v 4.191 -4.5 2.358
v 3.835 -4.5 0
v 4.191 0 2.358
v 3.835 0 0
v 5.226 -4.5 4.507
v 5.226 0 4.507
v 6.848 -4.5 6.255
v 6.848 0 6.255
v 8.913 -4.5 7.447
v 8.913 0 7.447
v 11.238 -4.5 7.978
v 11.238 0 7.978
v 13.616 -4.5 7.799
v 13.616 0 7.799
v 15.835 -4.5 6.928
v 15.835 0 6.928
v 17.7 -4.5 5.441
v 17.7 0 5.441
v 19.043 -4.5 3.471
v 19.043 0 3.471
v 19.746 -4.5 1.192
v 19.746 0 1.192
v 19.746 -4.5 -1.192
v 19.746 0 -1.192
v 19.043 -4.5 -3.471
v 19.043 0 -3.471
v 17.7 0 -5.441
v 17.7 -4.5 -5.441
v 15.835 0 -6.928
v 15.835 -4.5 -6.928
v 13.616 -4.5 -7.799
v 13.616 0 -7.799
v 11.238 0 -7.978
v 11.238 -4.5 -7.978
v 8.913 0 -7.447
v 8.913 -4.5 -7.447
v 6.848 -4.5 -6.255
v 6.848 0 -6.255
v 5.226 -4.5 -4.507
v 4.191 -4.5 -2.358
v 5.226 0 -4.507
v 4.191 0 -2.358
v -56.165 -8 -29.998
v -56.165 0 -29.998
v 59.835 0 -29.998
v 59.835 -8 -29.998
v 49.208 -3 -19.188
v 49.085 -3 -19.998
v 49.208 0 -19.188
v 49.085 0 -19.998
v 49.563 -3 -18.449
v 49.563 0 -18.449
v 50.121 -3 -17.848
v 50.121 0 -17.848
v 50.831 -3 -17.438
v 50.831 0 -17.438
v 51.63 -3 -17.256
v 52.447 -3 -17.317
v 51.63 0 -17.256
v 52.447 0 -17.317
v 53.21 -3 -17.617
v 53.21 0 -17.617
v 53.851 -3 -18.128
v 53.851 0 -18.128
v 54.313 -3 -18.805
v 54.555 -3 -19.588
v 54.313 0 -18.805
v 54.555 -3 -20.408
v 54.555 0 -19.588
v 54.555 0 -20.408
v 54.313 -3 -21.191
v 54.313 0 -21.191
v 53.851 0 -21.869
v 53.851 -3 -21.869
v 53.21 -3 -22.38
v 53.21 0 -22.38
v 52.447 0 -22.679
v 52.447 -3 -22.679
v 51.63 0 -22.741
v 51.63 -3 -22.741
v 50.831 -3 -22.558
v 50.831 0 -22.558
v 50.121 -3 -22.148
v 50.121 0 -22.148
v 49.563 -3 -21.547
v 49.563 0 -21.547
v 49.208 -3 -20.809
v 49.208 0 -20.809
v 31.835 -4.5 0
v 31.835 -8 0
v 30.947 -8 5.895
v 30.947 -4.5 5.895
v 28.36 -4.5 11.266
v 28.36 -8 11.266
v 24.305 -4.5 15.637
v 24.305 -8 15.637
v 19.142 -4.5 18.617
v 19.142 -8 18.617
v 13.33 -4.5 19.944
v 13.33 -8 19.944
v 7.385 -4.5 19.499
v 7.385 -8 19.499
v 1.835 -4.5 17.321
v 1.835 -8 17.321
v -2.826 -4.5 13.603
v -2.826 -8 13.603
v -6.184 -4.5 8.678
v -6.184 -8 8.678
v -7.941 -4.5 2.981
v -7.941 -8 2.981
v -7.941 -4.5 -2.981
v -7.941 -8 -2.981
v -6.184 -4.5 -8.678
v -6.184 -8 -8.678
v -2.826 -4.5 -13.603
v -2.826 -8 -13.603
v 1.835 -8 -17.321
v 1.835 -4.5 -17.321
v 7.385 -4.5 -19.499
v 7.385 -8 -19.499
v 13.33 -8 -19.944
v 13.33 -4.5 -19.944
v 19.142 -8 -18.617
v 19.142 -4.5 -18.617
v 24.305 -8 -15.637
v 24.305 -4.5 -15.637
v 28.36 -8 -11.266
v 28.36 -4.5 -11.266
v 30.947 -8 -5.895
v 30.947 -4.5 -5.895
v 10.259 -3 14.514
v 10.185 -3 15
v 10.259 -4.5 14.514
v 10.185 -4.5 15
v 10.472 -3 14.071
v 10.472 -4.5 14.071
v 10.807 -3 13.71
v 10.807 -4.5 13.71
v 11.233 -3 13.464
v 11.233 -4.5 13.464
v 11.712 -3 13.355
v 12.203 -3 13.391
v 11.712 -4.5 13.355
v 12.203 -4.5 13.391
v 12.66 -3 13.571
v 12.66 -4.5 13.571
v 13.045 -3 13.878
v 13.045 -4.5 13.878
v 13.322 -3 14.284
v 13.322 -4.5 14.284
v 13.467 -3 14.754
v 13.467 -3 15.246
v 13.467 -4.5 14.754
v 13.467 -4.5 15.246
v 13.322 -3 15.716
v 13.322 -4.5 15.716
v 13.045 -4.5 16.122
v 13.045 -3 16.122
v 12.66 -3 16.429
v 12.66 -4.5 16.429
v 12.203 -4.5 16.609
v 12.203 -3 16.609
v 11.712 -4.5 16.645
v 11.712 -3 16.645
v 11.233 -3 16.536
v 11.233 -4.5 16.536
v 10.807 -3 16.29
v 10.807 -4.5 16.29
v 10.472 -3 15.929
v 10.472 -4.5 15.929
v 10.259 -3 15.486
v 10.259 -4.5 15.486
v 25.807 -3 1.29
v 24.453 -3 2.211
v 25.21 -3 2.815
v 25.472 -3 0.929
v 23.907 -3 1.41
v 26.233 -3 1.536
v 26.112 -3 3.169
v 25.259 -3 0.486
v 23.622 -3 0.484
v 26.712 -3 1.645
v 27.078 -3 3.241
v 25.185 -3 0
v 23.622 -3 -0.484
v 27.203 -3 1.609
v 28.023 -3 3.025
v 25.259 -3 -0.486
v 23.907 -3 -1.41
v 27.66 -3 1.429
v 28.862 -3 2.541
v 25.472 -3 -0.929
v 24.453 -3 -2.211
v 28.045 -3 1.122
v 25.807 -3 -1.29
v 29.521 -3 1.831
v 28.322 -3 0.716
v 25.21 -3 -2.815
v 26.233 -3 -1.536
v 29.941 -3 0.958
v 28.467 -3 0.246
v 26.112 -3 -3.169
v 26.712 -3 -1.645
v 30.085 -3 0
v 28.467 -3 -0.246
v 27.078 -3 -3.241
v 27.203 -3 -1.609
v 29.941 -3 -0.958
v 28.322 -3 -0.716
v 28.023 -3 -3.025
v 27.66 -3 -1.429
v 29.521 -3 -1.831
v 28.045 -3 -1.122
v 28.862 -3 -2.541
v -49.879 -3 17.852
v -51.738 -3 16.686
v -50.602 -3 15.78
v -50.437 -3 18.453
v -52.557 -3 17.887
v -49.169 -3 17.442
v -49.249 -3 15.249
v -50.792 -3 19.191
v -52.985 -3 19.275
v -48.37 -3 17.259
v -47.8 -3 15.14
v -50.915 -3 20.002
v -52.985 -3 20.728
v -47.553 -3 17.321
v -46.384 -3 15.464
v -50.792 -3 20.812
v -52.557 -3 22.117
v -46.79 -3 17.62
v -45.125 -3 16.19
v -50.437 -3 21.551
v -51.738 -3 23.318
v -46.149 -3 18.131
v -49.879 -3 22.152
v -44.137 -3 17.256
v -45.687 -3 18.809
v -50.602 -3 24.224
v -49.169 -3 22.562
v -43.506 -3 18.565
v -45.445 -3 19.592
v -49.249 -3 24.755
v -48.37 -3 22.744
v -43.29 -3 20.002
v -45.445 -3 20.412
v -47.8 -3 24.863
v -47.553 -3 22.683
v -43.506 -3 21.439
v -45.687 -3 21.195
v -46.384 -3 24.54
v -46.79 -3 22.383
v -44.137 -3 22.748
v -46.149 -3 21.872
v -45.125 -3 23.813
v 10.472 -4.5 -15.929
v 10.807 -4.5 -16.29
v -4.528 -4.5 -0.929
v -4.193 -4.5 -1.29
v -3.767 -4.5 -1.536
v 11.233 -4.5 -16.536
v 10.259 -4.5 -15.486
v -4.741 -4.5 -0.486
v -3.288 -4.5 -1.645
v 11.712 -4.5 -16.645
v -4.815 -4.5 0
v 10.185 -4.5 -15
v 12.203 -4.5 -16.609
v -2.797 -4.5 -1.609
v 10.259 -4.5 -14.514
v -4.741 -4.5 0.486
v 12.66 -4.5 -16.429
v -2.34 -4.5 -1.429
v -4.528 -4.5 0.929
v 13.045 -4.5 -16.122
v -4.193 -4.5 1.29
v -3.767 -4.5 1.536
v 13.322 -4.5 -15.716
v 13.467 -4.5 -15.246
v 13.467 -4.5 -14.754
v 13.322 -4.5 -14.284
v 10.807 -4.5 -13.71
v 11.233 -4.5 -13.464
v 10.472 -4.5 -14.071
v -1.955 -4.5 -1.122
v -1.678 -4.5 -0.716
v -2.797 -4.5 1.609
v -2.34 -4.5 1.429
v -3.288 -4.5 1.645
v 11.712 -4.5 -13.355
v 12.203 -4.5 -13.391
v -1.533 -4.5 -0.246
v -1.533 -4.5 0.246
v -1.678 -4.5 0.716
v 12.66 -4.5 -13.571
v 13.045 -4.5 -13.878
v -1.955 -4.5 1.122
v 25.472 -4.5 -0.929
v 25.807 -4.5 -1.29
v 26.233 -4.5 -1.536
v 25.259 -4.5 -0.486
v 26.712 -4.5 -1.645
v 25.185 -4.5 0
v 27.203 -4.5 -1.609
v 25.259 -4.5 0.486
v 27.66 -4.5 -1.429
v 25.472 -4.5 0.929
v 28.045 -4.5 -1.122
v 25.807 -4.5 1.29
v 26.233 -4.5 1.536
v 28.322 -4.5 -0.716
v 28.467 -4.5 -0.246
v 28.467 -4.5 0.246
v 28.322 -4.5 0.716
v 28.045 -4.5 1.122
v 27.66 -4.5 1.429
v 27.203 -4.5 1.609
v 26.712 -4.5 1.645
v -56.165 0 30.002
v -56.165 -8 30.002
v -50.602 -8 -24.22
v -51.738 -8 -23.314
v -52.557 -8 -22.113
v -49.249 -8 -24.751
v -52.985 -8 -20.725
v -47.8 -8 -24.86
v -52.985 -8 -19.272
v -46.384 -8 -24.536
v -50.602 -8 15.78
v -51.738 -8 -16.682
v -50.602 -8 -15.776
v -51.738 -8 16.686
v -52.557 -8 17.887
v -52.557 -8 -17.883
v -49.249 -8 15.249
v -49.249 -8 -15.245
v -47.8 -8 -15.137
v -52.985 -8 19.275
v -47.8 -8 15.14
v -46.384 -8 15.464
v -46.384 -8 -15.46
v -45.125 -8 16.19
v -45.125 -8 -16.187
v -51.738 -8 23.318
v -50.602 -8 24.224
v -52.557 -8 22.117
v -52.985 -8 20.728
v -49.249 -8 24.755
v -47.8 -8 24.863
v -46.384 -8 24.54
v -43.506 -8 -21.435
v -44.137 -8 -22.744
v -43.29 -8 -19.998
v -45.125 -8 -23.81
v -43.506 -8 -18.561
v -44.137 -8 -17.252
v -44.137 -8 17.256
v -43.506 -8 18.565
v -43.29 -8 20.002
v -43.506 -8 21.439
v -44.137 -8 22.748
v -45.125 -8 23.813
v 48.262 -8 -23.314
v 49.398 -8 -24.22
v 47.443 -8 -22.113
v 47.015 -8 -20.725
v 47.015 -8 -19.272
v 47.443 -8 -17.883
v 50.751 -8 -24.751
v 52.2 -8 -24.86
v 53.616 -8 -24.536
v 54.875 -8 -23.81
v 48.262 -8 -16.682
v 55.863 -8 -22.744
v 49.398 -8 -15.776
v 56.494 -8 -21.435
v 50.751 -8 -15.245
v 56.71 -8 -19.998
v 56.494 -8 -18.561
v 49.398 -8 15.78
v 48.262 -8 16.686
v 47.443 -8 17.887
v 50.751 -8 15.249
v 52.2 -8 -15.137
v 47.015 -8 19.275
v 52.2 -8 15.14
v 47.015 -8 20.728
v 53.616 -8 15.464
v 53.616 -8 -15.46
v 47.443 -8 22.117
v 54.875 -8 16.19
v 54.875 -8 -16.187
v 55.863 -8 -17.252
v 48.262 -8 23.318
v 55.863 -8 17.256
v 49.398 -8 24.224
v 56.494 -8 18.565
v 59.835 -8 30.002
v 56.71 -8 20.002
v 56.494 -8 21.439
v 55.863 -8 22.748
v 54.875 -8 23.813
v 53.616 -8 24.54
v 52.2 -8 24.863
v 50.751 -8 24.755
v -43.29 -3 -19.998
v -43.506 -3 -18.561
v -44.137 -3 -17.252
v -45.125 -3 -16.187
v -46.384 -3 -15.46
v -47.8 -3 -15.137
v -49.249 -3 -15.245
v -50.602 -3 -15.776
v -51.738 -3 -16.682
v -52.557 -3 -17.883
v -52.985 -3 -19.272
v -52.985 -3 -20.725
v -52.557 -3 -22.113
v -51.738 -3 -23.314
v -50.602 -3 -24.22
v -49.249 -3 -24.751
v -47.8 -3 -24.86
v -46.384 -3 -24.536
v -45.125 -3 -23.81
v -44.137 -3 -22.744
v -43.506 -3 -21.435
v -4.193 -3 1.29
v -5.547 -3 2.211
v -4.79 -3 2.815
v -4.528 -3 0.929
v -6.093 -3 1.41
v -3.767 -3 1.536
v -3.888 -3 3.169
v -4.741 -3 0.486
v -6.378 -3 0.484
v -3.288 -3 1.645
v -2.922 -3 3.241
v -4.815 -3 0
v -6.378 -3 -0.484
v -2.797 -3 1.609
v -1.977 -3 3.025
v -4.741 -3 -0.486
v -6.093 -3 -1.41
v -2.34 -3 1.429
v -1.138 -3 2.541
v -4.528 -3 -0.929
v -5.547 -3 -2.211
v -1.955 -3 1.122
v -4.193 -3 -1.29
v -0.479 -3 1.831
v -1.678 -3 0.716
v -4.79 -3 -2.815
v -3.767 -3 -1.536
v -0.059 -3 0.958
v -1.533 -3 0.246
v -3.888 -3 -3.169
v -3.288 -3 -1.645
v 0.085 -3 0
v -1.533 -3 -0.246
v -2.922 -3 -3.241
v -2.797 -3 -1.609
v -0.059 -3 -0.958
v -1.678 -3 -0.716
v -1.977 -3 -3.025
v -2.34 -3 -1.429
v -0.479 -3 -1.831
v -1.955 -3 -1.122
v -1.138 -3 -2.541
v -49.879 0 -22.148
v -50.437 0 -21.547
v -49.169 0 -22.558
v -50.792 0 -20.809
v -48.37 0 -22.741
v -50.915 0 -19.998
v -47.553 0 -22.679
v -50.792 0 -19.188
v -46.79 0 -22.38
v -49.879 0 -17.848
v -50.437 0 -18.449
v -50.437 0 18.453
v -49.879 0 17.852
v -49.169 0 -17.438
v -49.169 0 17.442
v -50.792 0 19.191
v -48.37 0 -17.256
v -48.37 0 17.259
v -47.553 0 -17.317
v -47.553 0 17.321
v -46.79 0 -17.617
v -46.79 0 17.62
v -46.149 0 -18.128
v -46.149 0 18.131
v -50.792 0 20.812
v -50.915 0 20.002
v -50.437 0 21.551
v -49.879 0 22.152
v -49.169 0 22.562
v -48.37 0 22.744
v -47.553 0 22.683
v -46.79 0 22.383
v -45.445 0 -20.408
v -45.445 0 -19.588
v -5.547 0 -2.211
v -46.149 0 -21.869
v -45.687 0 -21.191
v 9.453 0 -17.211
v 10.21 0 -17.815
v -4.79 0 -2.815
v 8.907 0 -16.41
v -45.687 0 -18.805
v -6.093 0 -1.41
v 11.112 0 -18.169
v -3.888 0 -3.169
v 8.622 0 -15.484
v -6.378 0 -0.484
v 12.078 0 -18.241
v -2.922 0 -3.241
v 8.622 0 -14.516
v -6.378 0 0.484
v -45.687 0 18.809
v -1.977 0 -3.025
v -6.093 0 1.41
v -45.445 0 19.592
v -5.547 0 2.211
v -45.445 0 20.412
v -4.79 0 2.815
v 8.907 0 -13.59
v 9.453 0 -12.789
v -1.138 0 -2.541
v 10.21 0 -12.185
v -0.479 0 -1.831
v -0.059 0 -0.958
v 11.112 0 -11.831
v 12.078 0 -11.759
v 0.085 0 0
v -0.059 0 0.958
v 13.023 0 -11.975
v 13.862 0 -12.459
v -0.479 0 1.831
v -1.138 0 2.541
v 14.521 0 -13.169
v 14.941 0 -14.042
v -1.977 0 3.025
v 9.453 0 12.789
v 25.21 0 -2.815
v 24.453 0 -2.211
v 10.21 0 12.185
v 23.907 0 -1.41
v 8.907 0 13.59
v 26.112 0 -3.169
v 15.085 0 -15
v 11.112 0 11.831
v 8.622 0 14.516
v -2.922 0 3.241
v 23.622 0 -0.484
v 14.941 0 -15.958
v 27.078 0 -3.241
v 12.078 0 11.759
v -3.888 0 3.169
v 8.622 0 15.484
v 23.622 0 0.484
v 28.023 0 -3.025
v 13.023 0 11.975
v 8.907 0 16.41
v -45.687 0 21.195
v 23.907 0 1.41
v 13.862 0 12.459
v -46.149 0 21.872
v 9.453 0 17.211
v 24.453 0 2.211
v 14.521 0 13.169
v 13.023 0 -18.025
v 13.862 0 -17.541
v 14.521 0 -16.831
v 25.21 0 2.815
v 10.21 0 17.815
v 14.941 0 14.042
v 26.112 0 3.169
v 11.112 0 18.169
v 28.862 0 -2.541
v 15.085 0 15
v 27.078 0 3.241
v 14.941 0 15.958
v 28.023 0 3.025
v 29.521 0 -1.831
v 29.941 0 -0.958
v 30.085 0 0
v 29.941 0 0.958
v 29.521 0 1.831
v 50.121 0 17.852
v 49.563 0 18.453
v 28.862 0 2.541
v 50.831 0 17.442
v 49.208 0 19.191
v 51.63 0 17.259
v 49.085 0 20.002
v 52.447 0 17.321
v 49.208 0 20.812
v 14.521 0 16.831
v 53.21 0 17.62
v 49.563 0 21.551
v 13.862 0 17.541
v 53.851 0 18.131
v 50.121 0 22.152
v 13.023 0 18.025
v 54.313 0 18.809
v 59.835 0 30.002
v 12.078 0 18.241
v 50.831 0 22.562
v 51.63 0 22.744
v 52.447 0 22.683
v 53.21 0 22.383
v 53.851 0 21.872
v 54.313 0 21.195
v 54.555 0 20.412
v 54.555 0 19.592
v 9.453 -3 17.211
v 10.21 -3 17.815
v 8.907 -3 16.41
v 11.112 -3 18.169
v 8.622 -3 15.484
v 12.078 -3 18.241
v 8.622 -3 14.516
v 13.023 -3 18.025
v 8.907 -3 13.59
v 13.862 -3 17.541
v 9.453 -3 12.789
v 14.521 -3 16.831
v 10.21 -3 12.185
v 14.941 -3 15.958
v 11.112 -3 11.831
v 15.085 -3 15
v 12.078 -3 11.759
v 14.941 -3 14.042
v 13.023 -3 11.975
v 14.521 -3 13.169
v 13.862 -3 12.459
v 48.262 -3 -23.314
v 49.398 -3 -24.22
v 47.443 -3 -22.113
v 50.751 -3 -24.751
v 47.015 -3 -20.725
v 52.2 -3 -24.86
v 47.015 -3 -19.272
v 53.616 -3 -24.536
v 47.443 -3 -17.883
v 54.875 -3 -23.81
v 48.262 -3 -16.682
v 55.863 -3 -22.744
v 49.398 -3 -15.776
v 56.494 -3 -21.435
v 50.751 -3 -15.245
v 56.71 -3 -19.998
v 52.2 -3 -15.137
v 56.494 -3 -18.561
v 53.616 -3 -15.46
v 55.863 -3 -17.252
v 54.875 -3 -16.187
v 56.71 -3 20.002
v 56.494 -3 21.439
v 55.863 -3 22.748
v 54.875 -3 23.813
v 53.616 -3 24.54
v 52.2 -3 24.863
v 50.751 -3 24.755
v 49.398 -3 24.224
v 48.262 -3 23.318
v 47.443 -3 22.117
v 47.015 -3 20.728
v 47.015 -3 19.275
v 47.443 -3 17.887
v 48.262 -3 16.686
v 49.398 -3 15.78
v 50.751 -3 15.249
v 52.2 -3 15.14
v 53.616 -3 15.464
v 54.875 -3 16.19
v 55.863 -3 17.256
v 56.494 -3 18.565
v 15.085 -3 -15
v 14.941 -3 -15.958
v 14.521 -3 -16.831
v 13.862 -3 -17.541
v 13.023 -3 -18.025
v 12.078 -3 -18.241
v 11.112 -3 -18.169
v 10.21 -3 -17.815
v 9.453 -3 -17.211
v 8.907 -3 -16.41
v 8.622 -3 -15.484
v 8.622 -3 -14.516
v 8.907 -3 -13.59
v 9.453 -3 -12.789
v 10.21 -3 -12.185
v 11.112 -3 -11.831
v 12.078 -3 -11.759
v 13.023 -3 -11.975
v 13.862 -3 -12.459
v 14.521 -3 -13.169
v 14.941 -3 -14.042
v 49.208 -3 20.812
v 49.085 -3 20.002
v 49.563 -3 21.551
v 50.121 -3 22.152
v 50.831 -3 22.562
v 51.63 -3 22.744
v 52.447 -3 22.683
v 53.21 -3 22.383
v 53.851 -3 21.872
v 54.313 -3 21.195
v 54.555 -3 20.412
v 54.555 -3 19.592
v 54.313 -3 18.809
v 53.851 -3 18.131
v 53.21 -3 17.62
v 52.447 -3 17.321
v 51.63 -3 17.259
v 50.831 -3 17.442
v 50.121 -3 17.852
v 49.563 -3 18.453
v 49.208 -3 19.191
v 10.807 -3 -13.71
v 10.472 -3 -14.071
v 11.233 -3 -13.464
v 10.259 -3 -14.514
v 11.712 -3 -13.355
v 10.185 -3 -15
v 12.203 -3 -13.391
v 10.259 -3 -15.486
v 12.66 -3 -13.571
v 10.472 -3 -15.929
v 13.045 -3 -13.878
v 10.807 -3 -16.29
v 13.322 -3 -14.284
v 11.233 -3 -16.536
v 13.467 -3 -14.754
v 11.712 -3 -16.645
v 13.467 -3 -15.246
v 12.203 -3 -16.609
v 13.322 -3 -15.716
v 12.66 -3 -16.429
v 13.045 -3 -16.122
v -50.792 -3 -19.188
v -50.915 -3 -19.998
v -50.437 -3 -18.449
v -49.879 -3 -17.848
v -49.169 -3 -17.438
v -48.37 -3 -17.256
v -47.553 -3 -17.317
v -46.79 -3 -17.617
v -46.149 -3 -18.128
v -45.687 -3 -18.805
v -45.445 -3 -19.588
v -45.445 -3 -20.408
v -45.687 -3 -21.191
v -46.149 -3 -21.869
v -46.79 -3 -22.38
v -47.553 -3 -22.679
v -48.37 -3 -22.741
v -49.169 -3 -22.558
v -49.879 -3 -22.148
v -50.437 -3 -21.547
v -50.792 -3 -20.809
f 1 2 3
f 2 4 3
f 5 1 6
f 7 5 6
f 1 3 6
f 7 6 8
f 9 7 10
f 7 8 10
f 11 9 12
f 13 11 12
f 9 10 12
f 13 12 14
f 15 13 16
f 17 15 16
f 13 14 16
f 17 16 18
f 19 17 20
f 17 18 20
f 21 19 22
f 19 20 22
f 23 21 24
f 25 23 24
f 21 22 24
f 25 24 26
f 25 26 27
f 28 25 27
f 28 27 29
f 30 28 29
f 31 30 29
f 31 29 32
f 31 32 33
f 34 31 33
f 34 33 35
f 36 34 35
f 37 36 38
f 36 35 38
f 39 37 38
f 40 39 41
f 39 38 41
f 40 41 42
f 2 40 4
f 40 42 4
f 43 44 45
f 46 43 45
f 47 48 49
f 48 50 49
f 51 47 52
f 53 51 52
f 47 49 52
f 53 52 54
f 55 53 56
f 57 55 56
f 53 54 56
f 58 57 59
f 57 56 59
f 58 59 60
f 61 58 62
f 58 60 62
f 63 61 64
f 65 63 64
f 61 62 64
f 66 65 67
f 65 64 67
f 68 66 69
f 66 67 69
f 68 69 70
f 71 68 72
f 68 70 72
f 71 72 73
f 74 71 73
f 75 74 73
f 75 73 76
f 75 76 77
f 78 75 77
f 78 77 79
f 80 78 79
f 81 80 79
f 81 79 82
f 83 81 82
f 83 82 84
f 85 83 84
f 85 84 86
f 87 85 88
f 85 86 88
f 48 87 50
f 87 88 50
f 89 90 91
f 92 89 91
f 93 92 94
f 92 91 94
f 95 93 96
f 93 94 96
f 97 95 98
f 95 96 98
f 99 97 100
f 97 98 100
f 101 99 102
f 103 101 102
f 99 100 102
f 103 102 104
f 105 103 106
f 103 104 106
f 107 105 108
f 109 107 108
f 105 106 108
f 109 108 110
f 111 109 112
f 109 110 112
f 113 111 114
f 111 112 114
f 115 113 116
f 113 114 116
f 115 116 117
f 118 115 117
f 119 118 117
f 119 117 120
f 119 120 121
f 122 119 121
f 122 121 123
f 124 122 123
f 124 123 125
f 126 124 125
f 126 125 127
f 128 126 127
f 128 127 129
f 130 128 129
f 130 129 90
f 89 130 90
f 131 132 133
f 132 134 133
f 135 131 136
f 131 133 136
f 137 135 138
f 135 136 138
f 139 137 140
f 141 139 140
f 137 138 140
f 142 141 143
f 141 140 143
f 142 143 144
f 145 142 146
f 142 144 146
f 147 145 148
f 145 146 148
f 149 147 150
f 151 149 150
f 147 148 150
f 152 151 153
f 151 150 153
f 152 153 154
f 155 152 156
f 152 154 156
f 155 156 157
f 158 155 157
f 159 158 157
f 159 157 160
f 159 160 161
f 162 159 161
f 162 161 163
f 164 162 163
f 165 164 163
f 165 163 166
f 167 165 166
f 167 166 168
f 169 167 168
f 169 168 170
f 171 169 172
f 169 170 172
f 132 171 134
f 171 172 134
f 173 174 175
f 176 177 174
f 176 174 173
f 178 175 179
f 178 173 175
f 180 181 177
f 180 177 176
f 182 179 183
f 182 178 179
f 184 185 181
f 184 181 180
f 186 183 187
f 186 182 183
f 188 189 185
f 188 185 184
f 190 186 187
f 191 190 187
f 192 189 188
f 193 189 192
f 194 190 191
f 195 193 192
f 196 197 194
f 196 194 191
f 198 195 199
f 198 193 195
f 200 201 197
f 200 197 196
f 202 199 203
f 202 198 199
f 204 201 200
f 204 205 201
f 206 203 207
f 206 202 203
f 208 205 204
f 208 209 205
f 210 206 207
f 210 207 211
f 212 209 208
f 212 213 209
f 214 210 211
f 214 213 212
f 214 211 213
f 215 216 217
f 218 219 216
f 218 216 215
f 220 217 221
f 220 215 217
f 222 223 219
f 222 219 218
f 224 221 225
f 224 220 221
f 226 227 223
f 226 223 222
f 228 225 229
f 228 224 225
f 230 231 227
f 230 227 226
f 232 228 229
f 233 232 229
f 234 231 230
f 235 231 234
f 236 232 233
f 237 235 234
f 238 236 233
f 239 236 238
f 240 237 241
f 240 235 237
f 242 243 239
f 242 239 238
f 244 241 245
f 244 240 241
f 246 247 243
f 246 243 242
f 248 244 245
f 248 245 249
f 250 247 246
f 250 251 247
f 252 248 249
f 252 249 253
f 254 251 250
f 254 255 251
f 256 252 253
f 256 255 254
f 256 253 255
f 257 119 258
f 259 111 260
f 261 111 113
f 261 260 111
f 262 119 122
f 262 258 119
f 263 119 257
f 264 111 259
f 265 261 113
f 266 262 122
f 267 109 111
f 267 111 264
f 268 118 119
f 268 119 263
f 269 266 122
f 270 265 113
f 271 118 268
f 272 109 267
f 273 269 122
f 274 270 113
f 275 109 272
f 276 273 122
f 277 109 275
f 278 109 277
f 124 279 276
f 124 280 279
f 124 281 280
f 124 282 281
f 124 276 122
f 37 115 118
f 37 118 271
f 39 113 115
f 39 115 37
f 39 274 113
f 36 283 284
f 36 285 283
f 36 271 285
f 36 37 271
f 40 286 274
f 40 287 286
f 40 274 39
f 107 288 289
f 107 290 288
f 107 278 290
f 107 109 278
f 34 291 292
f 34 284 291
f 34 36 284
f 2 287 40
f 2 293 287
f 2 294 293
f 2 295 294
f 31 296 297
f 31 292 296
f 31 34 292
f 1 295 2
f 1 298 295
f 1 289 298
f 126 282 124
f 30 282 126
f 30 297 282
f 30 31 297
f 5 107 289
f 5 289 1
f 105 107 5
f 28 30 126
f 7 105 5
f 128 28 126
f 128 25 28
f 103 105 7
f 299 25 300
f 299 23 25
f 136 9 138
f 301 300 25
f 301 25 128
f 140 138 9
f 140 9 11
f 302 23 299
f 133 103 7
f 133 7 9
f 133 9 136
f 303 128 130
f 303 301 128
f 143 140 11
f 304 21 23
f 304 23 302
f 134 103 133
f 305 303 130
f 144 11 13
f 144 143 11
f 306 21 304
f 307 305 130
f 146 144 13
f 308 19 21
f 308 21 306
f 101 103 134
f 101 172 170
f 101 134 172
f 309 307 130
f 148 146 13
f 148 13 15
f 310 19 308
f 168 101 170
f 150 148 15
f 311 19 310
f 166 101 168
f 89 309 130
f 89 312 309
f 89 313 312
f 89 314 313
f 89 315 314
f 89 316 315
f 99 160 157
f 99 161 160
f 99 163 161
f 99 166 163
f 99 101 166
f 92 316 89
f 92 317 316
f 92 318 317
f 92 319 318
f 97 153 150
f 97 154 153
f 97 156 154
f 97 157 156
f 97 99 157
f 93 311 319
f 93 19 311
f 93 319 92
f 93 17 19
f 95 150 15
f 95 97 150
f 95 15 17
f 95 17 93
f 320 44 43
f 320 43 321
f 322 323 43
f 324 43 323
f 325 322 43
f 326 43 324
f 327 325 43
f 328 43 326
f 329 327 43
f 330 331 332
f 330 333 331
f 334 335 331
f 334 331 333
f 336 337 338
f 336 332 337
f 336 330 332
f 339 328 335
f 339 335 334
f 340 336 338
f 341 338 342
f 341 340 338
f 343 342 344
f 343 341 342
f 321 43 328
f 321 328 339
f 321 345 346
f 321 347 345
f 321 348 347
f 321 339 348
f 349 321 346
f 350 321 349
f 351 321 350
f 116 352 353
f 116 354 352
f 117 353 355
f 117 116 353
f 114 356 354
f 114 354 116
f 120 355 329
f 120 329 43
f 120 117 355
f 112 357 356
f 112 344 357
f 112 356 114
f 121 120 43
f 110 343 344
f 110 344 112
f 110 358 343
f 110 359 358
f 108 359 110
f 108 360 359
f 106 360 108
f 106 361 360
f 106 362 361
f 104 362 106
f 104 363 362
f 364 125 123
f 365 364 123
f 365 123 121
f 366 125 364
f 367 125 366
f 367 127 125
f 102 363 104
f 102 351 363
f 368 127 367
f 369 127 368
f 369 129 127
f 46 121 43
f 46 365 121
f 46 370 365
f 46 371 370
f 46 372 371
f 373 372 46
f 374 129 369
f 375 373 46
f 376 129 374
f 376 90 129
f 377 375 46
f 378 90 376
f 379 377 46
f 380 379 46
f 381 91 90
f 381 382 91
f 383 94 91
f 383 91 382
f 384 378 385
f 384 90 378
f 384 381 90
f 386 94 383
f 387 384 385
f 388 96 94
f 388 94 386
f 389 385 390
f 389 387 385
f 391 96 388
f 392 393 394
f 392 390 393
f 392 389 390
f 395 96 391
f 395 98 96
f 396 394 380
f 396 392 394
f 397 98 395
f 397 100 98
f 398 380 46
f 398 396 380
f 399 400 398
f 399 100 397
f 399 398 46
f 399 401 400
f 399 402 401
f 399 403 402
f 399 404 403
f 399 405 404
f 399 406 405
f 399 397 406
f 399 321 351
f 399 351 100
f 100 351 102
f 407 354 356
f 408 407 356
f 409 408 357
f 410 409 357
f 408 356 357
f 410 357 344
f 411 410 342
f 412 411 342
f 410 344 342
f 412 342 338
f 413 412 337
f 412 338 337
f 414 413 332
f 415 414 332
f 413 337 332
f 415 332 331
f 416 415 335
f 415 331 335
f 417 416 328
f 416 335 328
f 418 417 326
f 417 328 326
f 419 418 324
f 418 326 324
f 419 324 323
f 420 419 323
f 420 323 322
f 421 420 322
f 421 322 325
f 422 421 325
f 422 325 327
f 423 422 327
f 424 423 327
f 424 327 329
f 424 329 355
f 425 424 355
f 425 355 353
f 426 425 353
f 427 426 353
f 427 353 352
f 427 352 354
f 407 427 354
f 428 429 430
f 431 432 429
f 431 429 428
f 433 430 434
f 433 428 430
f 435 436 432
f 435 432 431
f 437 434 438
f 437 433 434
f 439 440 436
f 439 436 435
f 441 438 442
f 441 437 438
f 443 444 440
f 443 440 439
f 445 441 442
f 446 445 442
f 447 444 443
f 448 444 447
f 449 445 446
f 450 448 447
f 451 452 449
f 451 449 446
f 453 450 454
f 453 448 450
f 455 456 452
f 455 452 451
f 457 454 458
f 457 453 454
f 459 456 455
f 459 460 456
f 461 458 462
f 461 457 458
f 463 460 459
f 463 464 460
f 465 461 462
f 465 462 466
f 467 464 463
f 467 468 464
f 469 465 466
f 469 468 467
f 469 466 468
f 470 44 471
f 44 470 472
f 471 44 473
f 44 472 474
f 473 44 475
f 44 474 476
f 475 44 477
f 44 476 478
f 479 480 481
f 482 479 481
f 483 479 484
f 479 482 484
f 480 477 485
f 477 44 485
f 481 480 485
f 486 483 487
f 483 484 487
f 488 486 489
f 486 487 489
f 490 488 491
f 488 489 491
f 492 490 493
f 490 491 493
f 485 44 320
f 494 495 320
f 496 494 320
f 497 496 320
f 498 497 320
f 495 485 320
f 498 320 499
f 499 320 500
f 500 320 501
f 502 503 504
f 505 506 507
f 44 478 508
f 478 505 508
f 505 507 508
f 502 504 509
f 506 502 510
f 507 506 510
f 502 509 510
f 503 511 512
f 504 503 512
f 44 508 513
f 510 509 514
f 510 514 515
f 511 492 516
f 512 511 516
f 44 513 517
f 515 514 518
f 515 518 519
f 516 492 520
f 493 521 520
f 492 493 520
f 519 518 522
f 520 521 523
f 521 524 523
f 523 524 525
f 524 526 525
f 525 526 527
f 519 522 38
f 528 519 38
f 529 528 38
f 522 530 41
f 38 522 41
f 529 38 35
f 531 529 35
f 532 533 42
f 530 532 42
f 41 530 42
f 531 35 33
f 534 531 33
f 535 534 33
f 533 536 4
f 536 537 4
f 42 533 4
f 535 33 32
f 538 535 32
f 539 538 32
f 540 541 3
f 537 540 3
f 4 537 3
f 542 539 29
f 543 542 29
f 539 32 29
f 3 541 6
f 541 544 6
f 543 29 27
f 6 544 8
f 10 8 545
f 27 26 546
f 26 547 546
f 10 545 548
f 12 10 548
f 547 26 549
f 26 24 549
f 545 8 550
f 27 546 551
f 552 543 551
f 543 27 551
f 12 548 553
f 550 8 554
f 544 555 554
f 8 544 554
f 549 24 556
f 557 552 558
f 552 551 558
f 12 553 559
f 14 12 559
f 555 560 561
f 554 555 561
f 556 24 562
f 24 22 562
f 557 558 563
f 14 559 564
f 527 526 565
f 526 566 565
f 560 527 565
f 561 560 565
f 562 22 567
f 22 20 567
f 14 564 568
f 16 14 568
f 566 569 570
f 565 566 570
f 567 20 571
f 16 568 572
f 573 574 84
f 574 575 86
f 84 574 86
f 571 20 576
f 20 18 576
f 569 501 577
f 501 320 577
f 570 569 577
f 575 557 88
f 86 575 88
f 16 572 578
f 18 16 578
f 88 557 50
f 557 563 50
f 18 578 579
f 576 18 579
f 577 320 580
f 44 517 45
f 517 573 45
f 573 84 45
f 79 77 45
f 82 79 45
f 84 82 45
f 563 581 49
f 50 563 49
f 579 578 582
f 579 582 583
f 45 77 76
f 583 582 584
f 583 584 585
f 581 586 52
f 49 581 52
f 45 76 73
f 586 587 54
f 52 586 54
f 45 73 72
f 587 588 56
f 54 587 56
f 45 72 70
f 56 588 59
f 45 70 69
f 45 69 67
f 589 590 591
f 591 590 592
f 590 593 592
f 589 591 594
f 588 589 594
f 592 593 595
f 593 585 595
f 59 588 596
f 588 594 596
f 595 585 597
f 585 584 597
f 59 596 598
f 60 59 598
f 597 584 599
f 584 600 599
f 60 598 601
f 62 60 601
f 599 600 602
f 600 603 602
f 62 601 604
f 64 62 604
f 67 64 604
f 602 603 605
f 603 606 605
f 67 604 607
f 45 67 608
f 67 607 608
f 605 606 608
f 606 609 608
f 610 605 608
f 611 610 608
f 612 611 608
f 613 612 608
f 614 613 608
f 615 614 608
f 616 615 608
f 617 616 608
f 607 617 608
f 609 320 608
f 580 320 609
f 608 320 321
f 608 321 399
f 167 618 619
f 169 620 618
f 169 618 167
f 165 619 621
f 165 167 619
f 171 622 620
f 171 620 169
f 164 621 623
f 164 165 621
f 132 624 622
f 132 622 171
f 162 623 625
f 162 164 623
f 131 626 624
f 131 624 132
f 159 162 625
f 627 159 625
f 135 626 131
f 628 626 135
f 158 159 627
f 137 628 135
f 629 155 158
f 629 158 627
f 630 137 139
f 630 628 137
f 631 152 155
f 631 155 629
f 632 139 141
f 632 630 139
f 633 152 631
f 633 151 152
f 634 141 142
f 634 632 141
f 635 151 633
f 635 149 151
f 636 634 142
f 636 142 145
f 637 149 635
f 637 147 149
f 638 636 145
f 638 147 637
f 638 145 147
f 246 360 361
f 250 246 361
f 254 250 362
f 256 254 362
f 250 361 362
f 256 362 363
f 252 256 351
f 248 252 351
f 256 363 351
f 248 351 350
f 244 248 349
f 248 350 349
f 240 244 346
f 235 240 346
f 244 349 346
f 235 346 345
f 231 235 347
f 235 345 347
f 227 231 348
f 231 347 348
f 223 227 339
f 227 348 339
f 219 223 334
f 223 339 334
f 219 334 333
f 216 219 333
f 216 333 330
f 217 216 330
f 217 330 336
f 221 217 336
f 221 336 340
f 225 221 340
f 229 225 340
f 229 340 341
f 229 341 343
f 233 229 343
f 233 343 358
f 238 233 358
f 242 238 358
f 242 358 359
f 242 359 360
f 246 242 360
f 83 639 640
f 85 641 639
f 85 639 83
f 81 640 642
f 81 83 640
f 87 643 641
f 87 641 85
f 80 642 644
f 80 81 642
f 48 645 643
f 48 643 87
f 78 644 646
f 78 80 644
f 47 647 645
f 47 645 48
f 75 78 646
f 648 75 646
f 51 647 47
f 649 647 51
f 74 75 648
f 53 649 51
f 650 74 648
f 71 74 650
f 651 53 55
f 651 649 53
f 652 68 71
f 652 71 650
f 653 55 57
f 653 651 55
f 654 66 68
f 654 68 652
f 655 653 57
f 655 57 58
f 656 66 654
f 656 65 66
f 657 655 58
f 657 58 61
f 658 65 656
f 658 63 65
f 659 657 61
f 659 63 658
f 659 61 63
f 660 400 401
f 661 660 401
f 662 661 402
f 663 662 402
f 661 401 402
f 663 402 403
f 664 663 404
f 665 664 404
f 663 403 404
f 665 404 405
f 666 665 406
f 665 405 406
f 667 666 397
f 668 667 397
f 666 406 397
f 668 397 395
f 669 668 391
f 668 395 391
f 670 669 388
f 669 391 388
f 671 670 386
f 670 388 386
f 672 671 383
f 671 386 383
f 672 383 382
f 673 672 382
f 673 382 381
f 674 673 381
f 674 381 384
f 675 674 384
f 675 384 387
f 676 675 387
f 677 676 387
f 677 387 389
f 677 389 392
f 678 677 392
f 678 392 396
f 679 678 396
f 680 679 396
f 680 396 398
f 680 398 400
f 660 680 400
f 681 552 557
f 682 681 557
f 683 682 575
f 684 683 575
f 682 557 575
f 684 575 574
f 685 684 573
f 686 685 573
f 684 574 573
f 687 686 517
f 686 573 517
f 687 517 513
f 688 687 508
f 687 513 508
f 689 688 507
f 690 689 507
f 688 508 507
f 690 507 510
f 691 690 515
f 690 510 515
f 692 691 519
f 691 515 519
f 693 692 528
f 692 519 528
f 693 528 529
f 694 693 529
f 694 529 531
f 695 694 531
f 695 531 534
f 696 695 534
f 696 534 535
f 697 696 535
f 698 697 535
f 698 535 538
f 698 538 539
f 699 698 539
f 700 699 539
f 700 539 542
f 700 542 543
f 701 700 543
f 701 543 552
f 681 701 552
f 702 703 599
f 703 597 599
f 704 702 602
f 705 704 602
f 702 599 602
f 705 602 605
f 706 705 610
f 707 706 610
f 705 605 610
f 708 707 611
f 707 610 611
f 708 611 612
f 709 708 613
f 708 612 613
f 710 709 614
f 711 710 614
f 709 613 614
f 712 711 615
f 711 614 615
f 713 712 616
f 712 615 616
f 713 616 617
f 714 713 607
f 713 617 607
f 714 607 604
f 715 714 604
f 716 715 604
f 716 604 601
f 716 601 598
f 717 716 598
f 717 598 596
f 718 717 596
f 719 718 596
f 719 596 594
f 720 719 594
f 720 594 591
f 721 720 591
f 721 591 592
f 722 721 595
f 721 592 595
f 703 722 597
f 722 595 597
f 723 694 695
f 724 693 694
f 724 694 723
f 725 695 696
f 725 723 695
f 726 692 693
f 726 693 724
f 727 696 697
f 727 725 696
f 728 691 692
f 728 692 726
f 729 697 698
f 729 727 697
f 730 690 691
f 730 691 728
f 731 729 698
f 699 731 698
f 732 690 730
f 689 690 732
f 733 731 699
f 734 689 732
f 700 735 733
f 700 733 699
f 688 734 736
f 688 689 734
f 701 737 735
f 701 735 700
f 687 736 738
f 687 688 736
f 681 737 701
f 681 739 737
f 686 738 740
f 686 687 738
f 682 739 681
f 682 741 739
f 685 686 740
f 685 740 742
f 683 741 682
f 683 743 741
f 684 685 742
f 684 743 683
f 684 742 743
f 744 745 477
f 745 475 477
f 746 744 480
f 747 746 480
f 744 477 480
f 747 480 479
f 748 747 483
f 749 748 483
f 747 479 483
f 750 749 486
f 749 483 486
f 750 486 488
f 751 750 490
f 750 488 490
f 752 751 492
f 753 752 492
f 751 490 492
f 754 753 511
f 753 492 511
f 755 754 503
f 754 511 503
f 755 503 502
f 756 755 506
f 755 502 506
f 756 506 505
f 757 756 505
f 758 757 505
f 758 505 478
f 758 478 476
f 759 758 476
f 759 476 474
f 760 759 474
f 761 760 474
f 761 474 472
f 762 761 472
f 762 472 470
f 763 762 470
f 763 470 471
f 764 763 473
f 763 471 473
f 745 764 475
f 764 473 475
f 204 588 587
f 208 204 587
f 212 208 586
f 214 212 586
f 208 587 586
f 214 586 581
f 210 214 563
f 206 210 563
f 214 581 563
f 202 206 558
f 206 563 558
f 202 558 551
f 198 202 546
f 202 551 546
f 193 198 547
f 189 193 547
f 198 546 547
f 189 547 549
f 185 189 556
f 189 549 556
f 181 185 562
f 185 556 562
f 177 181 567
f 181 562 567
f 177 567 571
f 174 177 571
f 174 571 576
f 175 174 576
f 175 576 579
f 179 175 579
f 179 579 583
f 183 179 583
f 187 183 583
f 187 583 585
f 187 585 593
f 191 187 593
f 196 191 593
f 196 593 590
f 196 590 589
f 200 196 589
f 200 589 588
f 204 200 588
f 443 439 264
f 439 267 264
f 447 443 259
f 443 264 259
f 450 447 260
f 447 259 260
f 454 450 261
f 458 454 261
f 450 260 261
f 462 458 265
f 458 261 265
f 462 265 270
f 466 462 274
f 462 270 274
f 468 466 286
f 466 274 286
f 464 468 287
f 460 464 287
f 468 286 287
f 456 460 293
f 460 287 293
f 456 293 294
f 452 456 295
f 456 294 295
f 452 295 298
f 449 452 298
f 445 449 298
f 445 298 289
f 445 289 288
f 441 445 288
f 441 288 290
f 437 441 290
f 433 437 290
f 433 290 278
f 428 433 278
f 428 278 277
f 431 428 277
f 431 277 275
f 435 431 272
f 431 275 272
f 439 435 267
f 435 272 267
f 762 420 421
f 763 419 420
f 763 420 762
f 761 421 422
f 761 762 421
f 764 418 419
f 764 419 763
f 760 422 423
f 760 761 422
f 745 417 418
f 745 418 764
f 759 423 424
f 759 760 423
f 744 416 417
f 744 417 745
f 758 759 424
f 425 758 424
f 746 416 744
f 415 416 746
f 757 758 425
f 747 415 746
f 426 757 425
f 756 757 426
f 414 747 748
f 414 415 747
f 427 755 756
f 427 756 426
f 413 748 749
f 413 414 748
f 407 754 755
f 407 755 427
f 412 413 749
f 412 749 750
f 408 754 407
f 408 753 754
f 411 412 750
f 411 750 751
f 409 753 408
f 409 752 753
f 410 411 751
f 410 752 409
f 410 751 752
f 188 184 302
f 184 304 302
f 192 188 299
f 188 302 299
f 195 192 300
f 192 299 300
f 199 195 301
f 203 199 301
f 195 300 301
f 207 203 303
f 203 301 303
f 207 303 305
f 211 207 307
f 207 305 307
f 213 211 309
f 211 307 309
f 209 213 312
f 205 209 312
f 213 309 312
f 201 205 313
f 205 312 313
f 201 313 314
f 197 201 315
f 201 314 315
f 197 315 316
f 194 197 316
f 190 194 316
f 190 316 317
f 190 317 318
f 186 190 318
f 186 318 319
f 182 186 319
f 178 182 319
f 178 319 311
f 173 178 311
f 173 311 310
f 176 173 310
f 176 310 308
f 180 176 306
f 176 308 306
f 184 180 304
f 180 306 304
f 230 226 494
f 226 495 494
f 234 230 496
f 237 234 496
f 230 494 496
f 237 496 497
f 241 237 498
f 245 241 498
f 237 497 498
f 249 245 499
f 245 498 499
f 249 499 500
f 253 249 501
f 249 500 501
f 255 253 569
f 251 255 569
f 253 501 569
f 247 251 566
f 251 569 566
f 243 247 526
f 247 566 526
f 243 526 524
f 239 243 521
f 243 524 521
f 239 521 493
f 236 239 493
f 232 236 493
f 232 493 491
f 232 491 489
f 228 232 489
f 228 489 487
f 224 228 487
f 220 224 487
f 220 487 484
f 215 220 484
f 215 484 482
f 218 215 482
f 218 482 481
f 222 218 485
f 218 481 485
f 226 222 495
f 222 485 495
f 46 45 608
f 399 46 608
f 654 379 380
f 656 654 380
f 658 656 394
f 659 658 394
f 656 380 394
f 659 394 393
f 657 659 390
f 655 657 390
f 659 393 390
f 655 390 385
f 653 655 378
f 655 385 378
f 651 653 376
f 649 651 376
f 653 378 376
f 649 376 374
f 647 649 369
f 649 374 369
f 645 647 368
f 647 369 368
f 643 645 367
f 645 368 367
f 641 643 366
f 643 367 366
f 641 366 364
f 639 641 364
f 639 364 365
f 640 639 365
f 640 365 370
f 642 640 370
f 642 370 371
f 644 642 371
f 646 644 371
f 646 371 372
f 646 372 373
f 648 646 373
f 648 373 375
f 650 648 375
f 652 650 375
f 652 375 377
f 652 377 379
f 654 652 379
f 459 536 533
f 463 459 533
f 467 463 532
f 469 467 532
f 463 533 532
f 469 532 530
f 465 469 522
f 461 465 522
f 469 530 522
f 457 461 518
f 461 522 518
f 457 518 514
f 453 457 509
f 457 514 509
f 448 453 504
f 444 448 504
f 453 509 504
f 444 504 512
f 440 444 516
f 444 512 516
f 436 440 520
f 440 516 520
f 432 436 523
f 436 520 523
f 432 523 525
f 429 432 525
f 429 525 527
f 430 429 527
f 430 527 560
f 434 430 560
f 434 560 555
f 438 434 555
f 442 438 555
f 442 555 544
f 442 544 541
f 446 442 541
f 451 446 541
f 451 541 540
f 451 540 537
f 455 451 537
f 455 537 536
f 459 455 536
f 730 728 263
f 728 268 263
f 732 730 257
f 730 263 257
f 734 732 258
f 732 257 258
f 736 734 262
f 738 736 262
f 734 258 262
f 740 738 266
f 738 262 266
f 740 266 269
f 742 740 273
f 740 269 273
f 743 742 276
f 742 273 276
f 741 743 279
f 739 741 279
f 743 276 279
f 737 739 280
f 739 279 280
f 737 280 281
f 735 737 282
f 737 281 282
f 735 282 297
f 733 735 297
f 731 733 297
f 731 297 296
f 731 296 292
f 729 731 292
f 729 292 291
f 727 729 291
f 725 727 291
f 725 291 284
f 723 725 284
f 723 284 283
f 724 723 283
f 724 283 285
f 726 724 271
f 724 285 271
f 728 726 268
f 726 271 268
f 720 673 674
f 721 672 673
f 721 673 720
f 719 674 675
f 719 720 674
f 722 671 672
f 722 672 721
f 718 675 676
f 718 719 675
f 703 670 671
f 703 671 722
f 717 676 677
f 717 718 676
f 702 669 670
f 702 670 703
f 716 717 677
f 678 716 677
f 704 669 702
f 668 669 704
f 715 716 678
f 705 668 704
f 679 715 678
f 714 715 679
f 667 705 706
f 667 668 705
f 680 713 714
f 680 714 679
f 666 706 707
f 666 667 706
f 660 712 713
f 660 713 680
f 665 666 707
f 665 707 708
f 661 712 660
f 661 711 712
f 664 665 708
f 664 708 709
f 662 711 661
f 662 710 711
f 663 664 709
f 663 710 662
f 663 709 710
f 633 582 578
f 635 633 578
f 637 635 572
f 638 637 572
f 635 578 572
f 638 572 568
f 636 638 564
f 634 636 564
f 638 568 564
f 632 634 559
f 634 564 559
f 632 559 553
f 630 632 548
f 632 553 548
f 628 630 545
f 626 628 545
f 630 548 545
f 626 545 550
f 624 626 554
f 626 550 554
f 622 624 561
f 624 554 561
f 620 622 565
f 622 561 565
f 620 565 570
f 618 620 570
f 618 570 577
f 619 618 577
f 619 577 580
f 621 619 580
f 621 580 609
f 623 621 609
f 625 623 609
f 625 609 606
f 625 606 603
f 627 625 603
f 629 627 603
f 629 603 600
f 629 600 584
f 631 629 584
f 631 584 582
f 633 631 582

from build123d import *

# Parameters (mm, degrees)
F0_W           = 116
F0_H           = 60
F1_DEPTH       = 8
F3_D           = 5.5
F3_DEPTH       = 13.8
F3_CBORE_D     = 9.75
F3_CBORE_DEPTH = 5
F3_TIP         = 1.6523667023
F4_D           = 16
F4_DEPTH       = 13.8
F4_CBORE_D     = 40
F4_CBORE_DEPTH = 3.5
F4_TIP         = 4.8068849522
F5_D           = 3.3
F5_DEPTH       = 13.8
F5_CBORE_D     = 6.5
F5_CBORE_DEPTH = 3
F5_TIP         = 0.9914200214


with BuildPart() as f1:
    # F0 (on Front) → F1 (new body)
    with BuildSketch(Plane.XZ):
        with Locations((1.8354473706, 0.0017675648)):
            Rectangle(F0_W, F0_H)
    extrude(amount=F1_DEPTH)

    # F3
    with Locations(Plane.XZ.offset(8)):
        with Locations((-48.1645526294, 20.0017675648), (-48.1645526294, -19.9982324352), (51.8354473706, 20.0017675648), (51.8354473706, -19.9982324352)):
            CounterBoreHole(F3_D / 2, F3_CBORE_D / 2, F3_CBORE_DEPTH, depth=F3_DEPTH)
            with Locations((0, 0, -(F3_DEPTH + F3_TIP / 2))):  # 118° drill point
                Cone(0, F3_D / 2, F3_TIP, mode=Mode.SUBTRACT)

    # F4
    with Locations(Plane.XZ.offset(8)):
        with Locations((11.8354473706, 0)):
            CounterBoreHole(F4_D / 2, F4_CBORE_D / 2, F4_CBORE_DEPTH, depth=F4_DEPTH)
            with Locations((0, 0, -(F4_DEPTH + F4_TIP / 2))):  # 118° drill point
                Cone(0, F4_D / 2, F4_TIP, mode=Mode.SUBTRACT)

    # F5
    with Locations(Plane(origin=(0, 0, 0), x_dir=(1, 0, 0), z_dir=(0, 1, 0))):
        with Locations((11.8354473706, -15), (26.8354473706, 0), (11.8354473706, 15), (-3.1645526294, 0)):
            CounterBoreHole(F5_D / 2, F5_CBORE_D / 2, F5_CBORE_DEPTH, depth=F5_DEPTH)
            with Locations((0, 0, -(F5_DEPTH + F5_TIP / 2))):  # 118° drill point
                Cone(0, F5_D / 2, F5_TIP, mode=Mode.SUBTRACT)


solid = f1.part
